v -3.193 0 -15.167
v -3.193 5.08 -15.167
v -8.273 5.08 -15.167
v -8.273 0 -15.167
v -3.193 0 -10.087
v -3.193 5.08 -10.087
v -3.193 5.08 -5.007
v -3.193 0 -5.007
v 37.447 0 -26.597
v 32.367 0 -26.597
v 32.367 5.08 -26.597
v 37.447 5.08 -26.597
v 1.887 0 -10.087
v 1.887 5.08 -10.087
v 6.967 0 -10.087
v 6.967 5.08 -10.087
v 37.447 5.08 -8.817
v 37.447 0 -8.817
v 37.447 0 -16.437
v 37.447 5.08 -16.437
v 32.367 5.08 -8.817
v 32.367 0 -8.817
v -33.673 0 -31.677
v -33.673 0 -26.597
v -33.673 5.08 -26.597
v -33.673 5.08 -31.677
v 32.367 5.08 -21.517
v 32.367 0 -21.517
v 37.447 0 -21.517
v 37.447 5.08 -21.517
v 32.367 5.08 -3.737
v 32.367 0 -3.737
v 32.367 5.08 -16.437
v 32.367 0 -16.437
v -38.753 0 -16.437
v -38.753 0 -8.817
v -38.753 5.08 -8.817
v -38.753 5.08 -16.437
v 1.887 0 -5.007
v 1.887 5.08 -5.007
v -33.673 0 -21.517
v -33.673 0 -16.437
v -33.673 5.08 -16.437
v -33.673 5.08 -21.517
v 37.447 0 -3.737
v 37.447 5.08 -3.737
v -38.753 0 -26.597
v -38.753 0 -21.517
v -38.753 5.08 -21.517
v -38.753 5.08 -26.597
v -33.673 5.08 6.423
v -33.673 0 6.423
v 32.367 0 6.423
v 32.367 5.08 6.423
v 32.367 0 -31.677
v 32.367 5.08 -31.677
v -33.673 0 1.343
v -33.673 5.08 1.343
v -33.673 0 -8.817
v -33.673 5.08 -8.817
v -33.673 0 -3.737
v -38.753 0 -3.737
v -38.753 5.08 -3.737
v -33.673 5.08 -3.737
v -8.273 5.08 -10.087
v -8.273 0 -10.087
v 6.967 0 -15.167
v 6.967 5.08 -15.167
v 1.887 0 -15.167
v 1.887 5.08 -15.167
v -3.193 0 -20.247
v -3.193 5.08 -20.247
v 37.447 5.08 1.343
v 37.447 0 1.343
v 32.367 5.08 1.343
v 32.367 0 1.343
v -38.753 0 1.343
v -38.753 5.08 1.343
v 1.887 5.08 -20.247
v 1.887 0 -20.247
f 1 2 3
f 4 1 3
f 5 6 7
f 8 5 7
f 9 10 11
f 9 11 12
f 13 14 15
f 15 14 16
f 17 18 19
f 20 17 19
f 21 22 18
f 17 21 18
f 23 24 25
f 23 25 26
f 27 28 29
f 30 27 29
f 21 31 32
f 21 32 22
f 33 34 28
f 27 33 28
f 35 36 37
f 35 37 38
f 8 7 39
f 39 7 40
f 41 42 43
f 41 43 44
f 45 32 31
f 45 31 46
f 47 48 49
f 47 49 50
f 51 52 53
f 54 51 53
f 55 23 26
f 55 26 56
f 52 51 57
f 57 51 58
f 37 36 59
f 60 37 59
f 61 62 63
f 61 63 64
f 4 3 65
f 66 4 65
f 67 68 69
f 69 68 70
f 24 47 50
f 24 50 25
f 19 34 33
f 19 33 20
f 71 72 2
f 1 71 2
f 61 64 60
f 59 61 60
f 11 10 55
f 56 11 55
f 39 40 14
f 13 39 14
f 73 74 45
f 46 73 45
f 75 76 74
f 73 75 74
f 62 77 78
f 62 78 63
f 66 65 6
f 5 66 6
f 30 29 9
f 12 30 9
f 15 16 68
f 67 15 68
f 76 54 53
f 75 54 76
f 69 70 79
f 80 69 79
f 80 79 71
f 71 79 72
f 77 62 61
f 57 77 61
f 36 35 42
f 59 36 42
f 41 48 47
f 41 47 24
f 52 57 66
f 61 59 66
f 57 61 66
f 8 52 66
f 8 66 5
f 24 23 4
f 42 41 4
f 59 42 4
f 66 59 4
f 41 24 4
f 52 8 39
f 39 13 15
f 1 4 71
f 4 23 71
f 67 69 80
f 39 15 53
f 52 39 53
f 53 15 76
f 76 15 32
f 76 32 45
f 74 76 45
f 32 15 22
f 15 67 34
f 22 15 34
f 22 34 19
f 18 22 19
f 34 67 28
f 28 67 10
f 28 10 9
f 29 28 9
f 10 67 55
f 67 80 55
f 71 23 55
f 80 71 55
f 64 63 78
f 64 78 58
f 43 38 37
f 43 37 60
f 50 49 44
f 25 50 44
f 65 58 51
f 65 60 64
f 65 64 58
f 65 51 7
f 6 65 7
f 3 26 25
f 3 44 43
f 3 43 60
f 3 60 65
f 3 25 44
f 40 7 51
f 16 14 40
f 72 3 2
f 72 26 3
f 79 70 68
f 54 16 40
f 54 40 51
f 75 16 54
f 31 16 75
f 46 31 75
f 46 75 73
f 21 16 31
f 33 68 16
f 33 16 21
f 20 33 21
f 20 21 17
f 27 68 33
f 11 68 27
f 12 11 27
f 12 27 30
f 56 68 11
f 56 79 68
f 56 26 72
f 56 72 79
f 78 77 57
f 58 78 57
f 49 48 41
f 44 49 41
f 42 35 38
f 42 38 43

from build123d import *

# Parameters (mm, degrees)
SKETCH1_W           = 76.2
SKETCH1_H           = 38.1
BOSS_EXTRUDE1_DEPTH = 5.08
SKETCH2_W           = 5.08
SKETCH2_H           = 5.08
CUT_EXTRUDE1_DEPTH  = 5.08


with BuildPart() as part:
    # Sketch1 → Boss-Extrude1 (new body)
    with BuildSketch(Plane(origin=(0, 0, 0), x_dir=(1, 0, 0), z_dir=(0, 1, 0))):
        with Locations((-0.653142857, 12.627428571)):
            Rectangle(SKETCH1_W, SKETCH1_H)
    extrude(amount=BOSS_EXTRUDE1_DEPTH)

    # Sketch2 → Cut-Extrude1 (cut)
    with BuildSketch(Plane(origin=(0, 5.08, 0), x_dir=(1, 0, 0), z_dir=(0, 1, 0))):
        Polygon((1.886857143, 20.247428571), (-3.193142857, 20.247428571), (-3.193142857, 15.167428571), (-8.273142857, 15.167428571), (-8.273142857, 10.087428571), (-3.193142857, 10.087428571), (-3.193142857, 5.007428571), (1.886857143, 5.007428571), (1.886857143, 10.087428571), (6.966857143, 10.087428571), (6.966857143, 15.167428571), (1.886857143, 15.167428571), align=None)
        with Locations((-36.213142857, 18.977428571)):
            Rectangle(SKETCH2_W, SKETCH2_H)
        with Locations((-36.213142857, 29.137428571)):
            Rectangle(SKETCH2_W, SKETCH2_H)
        with Locations((-36.213142857, -3.882571429)):
            Rectangle(SKETCH2_W, SKETCH2_H)
        with Locations((-36.213142857, 6.277428571)):
            Rectangle(SKETCH2_W, SKETCH2_H)
        with Locations((34.906857143, 6.277428571)):
            Rectangle(SKETCH2_W, SKETCH2_H)
        with Locations((34.906857143, -3.882571429)):
            Rectangle(SKETCH2_W, SKETCH2_H)
        with Locations((34.906857143, 29.137428571)):
            Rectangle(SKETCH2_W, SKETCH2_H)
        with Locations((34.906857143, 18.977428571)):
            Rectangle(SKETCH2_W, SKETCH2_H)
    extrude(amount=-CUT_EXTRUDE1_DEPTH, mode=Mode.SUBTRACT)


solid = part.part
